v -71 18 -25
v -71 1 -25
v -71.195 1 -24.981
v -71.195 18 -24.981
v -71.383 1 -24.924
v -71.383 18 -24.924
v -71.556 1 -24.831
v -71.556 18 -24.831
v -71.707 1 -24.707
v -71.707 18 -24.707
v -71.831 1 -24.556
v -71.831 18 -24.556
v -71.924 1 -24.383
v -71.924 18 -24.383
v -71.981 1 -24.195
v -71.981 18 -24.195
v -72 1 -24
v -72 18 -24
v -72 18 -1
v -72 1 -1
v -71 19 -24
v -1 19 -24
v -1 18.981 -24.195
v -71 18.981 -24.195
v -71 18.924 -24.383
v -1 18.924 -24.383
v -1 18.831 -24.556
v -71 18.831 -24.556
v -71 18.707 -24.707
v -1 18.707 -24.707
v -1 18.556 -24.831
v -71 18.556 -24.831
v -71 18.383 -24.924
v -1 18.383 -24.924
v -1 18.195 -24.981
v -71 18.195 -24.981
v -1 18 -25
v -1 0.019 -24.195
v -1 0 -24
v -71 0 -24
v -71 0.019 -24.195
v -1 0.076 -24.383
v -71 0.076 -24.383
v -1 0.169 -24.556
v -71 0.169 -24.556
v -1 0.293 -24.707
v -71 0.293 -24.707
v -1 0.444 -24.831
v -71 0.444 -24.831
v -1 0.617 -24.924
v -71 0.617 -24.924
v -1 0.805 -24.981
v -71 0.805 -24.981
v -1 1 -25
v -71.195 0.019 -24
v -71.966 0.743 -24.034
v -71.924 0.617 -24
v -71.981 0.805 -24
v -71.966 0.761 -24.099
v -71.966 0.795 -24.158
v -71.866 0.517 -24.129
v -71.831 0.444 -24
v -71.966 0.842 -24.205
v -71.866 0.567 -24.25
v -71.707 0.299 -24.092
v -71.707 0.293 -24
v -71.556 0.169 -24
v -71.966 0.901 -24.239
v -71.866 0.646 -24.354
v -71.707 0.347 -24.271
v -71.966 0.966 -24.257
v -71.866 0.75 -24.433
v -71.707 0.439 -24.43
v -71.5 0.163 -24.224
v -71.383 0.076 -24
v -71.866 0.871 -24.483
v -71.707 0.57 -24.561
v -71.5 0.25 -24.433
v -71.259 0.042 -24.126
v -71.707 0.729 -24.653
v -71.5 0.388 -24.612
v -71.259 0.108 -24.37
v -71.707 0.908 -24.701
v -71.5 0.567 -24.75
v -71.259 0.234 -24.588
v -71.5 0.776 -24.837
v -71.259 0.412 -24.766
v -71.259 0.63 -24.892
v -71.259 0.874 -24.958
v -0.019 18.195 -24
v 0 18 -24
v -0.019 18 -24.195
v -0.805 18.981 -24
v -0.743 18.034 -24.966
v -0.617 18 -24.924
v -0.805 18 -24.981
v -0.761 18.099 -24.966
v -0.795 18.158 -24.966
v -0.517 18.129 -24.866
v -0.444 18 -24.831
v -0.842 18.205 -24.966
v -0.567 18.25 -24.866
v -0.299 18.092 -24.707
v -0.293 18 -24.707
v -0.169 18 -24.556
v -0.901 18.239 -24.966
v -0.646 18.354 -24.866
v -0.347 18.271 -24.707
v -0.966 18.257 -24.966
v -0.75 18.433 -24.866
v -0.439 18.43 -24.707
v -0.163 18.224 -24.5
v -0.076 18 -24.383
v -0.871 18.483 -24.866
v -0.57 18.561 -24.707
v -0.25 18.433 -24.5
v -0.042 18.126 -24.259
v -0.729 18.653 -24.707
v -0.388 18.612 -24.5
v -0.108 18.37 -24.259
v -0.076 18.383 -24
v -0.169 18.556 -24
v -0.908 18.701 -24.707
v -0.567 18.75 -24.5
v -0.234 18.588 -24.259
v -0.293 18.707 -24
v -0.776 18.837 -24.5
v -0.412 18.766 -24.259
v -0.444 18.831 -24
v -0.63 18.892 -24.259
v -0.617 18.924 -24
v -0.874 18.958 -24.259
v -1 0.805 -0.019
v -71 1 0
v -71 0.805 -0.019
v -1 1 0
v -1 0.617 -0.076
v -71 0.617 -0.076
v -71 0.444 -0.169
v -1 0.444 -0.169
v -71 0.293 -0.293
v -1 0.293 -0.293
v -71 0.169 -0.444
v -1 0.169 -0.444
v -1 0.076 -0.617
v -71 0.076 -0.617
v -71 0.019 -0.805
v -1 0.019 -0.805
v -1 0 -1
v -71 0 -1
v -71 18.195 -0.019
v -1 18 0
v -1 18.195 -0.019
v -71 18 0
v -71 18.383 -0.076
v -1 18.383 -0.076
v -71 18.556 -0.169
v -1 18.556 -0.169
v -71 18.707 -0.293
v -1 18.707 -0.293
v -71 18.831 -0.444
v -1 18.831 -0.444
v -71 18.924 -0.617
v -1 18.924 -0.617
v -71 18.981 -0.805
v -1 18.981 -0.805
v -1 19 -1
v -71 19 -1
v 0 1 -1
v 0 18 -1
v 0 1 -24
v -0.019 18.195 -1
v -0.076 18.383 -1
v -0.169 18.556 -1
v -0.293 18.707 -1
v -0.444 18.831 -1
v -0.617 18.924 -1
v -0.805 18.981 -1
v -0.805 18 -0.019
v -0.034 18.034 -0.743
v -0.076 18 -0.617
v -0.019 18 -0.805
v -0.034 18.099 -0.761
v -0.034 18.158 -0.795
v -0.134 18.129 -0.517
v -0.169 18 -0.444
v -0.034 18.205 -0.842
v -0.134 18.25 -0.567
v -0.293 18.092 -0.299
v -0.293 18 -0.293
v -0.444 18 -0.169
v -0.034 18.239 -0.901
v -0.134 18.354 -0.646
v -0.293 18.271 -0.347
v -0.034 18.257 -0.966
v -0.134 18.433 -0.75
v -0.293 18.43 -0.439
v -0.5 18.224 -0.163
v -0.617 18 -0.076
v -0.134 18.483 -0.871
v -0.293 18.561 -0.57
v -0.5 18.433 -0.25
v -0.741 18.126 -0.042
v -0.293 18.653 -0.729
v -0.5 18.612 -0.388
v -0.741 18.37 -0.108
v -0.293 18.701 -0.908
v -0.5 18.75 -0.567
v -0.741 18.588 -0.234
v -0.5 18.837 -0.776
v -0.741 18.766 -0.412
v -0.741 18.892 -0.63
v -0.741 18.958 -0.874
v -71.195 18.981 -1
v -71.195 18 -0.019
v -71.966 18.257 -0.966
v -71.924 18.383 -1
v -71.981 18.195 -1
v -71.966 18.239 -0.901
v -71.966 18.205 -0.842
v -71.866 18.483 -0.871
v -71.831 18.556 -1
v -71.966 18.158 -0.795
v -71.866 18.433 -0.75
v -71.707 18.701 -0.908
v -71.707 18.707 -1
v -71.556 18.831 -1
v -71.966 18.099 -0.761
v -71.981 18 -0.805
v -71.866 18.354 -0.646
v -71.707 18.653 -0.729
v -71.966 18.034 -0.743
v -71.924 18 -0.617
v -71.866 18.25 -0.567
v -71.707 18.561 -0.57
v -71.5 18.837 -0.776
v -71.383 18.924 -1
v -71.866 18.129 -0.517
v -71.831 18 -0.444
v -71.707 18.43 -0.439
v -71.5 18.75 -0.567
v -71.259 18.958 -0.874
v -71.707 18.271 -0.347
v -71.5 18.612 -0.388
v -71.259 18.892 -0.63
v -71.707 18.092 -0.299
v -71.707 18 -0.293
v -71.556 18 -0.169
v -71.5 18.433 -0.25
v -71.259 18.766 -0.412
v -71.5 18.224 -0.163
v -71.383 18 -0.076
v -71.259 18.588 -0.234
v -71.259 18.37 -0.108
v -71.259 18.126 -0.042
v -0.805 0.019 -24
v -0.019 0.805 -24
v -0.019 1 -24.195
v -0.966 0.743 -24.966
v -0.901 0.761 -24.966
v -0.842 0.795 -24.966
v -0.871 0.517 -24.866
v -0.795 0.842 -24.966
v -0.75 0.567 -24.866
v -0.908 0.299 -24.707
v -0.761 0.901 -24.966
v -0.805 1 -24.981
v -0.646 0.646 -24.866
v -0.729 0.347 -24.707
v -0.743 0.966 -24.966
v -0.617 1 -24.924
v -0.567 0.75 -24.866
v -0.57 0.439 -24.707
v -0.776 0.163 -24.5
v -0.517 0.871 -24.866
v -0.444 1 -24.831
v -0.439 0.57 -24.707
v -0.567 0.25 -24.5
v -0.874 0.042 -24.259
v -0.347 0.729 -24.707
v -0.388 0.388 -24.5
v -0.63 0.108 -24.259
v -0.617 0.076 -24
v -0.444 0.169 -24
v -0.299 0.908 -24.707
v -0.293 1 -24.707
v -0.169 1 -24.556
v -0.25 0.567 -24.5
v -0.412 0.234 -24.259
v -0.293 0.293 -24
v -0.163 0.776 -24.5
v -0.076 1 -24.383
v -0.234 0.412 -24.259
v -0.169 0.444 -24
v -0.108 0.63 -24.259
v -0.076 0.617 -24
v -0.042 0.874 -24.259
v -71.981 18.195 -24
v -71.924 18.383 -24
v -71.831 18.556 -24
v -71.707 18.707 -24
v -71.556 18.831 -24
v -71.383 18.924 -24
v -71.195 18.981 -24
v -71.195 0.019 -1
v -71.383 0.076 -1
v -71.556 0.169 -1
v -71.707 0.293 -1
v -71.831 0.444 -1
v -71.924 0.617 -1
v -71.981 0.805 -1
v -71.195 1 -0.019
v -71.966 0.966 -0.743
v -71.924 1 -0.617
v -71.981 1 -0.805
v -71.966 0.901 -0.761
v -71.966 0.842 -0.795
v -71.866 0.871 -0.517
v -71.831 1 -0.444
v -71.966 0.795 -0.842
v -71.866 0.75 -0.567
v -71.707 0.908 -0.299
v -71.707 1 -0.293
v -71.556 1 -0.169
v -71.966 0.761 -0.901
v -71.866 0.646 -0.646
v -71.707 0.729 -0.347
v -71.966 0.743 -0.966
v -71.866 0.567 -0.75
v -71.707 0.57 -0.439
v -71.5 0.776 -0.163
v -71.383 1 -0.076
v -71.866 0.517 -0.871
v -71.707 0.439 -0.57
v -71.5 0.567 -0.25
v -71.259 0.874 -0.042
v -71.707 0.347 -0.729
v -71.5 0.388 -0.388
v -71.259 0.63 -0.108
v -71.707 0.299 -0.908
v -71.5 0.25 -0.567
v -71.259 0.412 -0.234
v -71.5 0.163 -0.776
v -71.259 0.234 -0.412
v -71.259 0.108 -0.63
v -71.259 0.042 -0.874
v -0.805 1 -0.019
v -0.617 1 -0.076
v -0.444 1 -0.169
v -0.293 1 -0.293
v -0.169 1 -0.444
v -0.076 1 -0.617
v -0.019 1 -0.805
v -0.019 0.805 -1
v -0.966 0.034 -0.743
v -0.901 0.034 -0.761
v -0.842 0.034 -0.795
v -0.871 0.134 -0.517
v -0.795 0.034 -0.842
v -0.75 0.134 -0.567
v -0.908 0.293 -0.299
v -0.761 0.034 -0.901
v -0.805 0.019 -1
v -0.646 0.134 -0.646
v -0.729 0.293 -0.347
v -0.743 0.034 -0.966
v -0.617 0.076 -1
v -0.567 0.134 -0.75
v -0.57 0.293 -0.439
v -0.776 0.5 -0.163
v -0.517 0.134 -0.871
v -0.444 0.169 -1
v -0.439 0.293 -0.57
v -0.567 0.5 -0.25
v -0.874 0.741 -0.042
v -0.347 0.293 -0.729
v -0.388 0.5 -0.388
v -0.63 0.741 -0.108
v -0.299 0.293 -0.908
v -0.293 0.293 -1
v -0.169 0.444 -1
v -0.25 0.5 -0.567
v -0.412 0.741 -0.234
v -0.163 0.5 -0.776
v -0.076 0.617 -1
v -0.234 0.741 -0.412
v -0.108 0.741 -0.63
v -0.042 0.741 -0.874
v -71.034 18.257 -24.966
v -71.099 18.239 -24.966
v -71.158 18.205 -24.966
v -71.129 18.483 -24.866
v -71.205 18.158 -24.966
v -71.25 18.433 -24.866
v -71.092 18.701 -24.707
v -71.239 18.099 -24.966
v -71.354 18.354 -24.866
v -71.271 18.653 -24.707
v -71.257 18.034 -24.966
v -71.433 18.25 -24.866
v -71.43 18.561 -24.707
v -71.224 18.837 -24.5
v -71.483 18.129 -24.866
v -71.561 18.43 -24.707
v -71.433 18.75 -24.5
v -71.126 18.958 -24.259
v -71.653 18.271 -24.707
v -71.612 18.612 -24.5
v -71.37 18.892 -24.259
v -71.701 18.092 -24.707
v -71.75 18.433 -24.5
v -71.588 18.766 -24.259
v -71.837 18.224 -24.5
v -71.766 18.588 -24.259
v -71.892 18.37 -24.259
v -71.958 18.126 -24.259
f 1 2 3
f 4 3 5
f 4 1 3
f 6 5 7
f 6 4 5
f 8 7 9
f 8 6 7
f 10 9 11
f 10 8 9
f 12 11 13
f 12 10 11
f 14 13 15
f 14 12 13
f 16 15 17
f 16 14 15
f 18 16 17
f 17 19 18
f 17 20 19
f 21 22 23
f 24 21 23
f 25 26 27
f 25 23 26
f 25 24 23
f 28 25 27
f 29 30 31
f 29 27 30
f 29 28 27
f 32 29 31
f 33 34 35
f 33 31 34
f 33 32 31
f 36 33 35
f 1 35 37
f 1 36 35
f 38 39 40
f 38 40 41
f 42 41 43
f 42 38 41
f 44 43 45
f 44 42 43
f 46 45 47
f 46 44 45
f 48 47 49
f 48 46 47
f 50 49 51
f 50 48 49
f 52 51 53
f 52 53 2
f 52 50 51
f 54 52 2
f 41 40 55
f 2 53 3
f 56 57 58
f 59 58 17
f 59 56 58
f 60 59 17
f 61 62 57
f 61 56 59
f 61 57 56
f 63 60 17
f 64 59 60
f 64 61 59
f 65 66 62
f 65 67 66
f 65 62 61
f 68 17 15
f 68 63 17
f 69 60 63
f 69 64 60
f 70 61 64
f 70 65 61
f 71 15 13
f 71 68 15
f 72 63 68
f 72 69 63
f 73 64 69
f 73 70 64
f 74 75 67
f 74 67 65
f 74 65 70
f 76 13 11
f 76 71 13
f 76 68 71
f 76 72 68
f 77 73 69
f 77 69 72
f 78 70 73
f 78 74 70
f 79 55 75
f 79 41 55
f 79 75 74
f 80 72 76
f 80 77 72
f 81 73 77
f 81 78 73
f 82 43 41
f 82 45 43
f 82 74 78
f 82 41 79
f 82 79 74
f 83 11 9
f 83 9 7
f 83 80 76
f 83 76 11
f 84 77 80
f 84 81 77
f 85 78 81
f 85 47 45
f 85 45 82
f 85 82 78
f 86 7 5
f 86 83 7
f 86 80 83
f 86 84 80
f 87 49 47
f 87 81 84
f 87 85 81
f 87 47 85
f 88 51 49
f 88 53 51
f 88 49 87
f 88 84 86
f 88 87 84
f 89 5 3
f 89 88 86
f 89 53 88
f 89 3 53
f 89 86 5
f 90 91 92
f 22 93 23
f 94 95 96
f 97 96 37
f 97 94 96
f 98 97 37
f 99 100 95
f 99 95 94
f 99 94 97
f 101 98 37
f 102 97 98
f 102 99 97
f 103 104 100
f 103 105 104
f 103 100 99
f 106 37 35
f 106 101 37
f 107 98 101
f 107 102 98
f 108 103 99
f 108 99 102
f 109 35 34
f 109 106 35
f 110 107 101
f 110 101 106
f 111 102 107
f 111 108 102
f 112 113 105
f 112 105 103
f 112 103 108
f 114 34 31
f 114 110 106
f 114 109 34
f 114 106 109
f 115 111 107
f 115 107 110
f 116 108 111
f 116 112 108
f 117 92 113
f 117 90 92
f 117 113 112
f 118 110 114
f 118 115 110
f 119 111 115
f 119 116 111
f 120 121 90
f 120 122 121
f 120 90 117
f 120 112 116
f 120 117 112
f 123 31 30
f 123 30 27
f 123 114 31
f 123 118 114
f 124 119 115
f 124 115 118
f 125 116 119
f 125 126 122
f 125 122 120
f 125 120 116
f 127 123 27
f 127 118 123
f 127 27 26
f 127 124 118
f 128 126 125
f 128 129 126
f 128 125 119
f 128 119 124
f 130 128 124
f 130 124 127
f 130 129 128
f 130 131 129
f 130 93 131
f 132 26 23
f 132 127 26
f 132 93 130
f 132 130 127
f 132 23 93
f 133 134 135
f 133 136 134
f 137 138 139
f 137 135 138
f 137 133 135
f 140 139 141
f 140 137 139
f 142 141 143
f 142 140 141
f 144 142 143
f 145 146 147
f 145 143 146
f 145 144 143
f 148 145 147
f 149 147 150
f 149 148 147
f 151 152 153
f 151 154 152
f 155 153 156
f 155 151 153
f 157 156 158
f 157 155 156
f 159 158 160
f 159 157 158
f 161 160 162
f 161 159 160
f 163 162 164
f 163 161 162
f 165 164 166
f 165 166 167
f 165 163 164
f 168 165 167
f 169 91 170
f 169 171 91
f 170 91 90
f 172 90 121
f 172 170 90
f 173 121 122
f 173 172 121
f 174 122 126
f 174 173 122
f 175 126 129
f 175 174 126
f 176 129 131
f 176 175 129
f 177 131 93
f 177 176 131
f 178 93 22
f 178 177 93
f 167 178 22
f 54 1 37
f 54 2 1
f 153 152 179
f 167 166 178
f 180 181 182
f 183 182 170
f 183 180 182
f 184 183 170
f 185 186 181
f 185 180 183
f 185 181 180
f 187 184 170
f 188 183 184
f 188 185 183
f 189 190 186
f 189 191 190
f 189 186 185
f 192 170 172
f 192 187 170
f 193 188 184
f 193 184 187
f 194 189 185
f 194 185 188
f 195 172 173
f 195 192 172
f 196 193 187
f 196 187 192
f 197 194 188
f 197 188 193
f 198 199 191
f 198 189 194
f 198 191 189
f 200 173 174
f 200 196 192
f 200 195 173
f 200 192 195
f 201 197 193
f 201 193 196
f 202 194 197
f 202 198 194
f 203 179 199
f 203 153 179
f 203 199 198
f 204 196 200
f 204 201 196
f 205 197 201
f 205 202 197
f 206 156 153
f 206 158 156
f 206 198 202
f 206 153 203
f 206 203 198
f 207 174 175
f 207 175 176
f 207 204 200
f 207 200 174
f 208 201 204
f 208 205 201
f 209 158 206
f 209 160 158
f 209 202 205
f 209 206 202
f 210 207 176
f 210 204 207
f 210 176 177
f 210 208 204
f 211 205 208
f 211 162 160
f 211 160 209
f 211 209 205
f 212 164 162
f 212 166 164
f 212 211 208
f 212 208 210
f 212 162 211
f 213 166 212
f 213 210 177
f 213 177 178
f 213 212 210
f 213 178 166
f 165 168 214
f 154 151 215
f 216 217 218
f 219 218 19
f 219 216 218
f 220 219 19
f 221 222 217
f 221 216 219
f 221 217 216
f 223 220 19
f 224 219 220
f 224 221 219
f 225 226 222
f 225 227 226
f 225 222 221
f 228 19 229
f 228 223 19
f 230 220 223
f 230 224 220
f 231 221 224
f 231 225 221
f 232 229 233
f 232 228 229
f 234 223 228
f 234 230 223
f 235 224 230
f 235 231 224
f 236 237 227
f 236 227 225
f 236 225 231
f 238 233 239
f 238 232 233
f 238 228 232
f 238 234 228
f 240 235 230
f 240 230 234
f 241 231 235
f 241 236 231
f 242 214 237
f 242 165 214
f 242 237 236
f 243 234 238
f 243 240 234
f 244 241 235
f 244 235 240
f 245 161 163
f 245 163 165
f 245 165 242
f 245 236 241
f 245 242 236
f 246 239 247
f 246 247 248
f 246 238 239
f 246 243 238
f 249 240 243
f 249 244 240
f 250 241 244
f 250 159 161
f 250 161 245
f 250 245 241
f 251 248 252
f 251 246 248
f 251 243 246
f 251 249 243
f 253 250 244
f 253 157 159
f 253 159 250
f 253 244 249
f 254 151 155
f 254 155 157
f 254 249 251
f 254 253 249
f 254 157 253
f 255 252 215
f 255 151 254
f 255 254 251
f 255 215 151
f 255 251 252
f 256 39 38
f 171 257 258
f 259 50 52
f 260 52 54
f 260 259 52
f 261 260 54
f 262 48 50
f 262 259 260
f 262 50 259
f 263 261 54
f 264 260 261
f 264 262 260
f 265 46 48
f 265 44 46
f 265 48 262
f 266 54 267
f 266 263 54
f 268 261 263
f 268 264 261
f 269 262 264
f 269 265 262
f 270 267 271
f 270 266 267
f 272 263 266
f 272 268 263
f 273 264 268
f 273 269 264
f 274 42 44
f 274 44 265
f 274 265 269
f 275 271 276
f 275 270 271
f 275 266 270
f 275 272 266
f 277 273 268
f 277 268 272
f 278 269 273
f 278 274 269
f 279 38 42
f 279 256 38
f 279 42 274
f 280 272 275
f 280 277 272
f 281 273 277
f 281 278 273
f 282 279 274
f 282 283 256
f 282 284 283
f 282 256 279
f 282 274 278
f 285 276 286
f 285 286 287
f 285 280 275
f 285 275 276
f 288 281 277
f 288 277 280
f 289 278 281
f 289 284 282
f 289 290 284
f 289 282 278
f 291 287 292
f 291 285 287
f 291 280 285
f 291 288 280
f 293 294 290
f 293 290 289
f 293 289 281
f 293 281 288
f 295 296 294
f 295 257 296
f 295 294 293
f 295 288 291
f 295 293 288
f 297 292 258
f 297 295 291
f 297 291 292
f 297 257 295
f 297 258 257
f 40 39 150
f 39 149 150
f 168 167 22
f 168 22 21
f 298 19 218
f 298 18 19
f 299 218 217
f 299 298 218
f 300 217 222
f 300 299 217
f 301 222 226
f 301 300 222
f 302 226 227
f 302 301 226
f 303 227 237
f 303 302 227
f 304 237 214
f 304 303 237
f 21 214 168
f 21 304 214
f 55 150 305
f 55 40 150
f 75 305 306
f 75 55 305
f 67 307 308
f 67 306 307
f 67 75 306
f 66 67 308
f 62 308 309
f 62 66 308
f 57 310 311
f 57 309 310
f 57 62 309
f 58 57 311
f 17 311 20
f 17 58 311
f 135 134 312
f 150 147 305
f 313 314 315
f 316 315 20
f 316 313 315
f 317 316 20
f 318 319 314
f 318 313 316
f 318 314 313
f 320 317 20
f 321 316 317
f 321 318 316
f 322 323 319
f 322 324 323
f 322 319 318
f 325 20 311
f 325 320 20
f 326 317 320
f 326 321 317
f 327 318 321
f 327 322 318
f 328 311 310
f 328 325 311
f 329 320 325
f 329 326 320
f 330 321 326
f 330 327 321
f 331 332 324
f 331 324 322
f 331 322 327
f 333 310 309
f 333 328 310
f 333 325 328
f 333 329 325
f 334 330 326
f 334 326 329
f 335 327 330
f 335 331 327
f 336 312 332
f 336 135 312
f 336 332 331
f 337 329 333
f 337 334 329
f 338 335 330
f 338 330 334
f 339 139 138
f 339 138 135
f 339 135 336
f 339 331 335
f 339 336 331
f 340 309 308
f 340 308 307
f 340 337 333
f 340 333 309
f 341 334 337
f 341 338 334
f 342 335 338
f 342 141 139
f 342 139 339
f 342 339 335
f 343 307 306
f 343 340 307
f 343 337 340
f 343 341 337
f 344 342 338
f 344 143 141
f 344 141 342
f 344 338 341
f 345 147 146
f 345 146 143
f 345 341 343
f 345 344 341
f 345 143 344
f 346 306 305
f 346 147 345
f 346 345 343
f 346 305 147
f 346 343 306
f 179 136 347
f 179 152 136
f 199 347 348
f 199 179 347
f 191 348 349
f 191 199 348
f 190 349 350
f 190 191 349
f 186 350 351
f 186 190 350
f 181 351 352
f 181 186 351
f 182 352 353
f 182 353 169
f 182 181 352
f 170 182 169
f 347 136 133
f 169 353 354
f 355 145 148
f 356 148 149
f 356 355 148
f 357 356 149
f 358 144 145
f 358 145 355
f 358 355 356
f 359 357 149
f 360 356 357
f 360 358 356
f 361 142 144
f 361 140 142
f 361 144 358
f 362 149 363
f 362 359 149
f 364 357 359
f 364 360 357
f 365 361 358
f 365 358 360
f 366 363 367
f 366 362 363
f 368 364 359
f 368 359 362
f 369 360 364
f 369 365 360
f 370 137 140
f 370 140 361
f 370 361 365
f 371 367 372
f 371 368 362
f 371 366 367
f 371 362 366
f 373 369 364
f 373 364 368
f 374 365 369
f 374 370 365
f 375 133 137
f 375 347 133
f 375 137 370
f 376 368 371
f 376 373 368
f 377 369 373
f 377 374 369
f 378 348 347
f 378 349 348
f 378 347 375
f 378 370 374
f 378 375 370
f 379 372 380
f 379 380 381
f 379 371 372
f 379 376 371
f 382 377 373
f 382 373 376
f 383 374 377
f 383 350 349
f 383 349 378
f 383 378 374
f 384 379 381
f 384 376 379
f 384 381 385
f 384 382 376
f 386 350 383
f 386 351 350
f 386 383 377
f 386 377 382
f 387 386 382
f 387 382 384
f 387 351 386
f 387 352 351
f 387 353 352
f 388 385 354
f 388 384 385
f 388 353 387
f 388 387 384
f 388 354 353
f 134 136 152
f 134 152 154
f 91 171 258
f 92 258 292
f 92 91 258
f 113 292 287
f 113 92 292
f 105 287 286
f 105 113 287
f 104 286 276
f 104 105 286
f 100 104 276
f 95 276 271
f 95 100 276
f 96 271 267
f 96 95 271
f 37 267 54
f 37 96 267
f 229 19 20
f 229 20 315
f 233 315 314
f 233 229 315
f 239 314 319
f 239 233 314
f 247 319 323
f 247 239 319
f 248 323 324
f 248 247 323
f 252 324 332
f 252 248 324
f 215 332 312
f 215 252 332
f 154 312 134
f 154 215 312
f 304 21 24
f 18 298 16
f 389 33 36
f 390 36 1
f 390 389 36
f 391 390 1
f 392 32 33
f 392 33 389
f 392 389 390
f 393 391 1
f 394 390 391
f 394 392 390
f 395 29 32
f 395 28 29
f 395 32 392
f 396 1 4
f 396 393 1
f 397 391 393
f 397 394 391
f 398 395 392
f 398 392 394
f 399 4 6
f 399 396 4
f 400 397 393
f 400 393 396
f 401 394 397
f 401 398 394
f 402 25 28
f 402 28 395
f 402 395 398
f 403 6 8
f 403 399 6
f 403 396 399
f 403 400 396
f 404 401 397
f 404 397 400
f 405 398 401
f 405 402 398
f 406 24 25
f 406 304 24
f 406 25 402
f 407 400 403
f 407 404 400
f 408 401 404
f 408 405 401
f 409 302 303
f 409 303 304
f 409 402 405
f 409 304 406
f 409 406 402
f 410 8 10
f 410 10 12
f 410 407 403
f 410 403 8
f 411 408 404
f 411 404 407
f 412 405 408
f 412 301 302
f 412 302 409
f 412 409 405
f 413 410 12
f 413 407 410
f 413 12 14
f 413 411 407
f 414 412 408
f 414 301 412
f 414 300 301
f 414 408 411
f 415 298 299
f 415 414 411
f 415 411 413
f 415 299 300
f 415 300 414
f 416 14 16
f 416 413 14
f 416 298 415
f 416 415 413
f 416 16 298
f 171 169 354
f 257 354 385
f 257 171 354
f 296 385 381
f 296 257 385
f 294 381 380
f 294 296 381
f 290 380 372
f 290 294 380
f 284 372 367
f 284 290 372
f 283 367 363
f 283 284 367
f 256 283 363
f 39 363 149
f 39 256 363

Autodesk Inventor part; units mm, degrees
ref_plane "YZ Plane" through (0, 0, 0) normal (1, 0, 0) x (0, 1, 0)
ref_plane "XZ Plane" through (0, 0, 0) normal (0, 1, 0) x (-1, 0, 0)
ref_plane "XY Plane" through (0, 0, 0) normal (0, 0, 1) x (1, 0, 0)
sketch "Sketch1" plane through (0, 0, 0) normal (0, 1, 0) x (-1, 0, 0)
  line L0 (0, 0) -> (72, 0)
  line L1 (72, 0) -> (72, -25)
  line L2 (72, -25) -> (0, -25)
  line L3 (0, -25) -> (0, 0)
  dimension "d0" = 72
  dimension "d1" = 25
extrude "Extrusion1" add sketch "Sketch1" along normal blind 19
fillet "Fillet1" radius 1 3 edges at (-36, 19, 0) (0, 9.5, 0) (0, 19, -12.5)
fillet "Fillet2" radius 1 12 edges at (-0.2929, 0, -0.2929) (0, 0, -13) (-36.5, 0, 0) (-36, 0, -25) (-72, 0, -12.5) (-72, 18.7071, -0.2929) (-72, 19, -13) (-72, 9, 0) (-72, 9.5, -25) (-0.2929, 18.7071, -25) (0, 9, -25) (-36.5, 19, -25)
properties part number "Battery[72x25x19]" material "Polypropylene"
